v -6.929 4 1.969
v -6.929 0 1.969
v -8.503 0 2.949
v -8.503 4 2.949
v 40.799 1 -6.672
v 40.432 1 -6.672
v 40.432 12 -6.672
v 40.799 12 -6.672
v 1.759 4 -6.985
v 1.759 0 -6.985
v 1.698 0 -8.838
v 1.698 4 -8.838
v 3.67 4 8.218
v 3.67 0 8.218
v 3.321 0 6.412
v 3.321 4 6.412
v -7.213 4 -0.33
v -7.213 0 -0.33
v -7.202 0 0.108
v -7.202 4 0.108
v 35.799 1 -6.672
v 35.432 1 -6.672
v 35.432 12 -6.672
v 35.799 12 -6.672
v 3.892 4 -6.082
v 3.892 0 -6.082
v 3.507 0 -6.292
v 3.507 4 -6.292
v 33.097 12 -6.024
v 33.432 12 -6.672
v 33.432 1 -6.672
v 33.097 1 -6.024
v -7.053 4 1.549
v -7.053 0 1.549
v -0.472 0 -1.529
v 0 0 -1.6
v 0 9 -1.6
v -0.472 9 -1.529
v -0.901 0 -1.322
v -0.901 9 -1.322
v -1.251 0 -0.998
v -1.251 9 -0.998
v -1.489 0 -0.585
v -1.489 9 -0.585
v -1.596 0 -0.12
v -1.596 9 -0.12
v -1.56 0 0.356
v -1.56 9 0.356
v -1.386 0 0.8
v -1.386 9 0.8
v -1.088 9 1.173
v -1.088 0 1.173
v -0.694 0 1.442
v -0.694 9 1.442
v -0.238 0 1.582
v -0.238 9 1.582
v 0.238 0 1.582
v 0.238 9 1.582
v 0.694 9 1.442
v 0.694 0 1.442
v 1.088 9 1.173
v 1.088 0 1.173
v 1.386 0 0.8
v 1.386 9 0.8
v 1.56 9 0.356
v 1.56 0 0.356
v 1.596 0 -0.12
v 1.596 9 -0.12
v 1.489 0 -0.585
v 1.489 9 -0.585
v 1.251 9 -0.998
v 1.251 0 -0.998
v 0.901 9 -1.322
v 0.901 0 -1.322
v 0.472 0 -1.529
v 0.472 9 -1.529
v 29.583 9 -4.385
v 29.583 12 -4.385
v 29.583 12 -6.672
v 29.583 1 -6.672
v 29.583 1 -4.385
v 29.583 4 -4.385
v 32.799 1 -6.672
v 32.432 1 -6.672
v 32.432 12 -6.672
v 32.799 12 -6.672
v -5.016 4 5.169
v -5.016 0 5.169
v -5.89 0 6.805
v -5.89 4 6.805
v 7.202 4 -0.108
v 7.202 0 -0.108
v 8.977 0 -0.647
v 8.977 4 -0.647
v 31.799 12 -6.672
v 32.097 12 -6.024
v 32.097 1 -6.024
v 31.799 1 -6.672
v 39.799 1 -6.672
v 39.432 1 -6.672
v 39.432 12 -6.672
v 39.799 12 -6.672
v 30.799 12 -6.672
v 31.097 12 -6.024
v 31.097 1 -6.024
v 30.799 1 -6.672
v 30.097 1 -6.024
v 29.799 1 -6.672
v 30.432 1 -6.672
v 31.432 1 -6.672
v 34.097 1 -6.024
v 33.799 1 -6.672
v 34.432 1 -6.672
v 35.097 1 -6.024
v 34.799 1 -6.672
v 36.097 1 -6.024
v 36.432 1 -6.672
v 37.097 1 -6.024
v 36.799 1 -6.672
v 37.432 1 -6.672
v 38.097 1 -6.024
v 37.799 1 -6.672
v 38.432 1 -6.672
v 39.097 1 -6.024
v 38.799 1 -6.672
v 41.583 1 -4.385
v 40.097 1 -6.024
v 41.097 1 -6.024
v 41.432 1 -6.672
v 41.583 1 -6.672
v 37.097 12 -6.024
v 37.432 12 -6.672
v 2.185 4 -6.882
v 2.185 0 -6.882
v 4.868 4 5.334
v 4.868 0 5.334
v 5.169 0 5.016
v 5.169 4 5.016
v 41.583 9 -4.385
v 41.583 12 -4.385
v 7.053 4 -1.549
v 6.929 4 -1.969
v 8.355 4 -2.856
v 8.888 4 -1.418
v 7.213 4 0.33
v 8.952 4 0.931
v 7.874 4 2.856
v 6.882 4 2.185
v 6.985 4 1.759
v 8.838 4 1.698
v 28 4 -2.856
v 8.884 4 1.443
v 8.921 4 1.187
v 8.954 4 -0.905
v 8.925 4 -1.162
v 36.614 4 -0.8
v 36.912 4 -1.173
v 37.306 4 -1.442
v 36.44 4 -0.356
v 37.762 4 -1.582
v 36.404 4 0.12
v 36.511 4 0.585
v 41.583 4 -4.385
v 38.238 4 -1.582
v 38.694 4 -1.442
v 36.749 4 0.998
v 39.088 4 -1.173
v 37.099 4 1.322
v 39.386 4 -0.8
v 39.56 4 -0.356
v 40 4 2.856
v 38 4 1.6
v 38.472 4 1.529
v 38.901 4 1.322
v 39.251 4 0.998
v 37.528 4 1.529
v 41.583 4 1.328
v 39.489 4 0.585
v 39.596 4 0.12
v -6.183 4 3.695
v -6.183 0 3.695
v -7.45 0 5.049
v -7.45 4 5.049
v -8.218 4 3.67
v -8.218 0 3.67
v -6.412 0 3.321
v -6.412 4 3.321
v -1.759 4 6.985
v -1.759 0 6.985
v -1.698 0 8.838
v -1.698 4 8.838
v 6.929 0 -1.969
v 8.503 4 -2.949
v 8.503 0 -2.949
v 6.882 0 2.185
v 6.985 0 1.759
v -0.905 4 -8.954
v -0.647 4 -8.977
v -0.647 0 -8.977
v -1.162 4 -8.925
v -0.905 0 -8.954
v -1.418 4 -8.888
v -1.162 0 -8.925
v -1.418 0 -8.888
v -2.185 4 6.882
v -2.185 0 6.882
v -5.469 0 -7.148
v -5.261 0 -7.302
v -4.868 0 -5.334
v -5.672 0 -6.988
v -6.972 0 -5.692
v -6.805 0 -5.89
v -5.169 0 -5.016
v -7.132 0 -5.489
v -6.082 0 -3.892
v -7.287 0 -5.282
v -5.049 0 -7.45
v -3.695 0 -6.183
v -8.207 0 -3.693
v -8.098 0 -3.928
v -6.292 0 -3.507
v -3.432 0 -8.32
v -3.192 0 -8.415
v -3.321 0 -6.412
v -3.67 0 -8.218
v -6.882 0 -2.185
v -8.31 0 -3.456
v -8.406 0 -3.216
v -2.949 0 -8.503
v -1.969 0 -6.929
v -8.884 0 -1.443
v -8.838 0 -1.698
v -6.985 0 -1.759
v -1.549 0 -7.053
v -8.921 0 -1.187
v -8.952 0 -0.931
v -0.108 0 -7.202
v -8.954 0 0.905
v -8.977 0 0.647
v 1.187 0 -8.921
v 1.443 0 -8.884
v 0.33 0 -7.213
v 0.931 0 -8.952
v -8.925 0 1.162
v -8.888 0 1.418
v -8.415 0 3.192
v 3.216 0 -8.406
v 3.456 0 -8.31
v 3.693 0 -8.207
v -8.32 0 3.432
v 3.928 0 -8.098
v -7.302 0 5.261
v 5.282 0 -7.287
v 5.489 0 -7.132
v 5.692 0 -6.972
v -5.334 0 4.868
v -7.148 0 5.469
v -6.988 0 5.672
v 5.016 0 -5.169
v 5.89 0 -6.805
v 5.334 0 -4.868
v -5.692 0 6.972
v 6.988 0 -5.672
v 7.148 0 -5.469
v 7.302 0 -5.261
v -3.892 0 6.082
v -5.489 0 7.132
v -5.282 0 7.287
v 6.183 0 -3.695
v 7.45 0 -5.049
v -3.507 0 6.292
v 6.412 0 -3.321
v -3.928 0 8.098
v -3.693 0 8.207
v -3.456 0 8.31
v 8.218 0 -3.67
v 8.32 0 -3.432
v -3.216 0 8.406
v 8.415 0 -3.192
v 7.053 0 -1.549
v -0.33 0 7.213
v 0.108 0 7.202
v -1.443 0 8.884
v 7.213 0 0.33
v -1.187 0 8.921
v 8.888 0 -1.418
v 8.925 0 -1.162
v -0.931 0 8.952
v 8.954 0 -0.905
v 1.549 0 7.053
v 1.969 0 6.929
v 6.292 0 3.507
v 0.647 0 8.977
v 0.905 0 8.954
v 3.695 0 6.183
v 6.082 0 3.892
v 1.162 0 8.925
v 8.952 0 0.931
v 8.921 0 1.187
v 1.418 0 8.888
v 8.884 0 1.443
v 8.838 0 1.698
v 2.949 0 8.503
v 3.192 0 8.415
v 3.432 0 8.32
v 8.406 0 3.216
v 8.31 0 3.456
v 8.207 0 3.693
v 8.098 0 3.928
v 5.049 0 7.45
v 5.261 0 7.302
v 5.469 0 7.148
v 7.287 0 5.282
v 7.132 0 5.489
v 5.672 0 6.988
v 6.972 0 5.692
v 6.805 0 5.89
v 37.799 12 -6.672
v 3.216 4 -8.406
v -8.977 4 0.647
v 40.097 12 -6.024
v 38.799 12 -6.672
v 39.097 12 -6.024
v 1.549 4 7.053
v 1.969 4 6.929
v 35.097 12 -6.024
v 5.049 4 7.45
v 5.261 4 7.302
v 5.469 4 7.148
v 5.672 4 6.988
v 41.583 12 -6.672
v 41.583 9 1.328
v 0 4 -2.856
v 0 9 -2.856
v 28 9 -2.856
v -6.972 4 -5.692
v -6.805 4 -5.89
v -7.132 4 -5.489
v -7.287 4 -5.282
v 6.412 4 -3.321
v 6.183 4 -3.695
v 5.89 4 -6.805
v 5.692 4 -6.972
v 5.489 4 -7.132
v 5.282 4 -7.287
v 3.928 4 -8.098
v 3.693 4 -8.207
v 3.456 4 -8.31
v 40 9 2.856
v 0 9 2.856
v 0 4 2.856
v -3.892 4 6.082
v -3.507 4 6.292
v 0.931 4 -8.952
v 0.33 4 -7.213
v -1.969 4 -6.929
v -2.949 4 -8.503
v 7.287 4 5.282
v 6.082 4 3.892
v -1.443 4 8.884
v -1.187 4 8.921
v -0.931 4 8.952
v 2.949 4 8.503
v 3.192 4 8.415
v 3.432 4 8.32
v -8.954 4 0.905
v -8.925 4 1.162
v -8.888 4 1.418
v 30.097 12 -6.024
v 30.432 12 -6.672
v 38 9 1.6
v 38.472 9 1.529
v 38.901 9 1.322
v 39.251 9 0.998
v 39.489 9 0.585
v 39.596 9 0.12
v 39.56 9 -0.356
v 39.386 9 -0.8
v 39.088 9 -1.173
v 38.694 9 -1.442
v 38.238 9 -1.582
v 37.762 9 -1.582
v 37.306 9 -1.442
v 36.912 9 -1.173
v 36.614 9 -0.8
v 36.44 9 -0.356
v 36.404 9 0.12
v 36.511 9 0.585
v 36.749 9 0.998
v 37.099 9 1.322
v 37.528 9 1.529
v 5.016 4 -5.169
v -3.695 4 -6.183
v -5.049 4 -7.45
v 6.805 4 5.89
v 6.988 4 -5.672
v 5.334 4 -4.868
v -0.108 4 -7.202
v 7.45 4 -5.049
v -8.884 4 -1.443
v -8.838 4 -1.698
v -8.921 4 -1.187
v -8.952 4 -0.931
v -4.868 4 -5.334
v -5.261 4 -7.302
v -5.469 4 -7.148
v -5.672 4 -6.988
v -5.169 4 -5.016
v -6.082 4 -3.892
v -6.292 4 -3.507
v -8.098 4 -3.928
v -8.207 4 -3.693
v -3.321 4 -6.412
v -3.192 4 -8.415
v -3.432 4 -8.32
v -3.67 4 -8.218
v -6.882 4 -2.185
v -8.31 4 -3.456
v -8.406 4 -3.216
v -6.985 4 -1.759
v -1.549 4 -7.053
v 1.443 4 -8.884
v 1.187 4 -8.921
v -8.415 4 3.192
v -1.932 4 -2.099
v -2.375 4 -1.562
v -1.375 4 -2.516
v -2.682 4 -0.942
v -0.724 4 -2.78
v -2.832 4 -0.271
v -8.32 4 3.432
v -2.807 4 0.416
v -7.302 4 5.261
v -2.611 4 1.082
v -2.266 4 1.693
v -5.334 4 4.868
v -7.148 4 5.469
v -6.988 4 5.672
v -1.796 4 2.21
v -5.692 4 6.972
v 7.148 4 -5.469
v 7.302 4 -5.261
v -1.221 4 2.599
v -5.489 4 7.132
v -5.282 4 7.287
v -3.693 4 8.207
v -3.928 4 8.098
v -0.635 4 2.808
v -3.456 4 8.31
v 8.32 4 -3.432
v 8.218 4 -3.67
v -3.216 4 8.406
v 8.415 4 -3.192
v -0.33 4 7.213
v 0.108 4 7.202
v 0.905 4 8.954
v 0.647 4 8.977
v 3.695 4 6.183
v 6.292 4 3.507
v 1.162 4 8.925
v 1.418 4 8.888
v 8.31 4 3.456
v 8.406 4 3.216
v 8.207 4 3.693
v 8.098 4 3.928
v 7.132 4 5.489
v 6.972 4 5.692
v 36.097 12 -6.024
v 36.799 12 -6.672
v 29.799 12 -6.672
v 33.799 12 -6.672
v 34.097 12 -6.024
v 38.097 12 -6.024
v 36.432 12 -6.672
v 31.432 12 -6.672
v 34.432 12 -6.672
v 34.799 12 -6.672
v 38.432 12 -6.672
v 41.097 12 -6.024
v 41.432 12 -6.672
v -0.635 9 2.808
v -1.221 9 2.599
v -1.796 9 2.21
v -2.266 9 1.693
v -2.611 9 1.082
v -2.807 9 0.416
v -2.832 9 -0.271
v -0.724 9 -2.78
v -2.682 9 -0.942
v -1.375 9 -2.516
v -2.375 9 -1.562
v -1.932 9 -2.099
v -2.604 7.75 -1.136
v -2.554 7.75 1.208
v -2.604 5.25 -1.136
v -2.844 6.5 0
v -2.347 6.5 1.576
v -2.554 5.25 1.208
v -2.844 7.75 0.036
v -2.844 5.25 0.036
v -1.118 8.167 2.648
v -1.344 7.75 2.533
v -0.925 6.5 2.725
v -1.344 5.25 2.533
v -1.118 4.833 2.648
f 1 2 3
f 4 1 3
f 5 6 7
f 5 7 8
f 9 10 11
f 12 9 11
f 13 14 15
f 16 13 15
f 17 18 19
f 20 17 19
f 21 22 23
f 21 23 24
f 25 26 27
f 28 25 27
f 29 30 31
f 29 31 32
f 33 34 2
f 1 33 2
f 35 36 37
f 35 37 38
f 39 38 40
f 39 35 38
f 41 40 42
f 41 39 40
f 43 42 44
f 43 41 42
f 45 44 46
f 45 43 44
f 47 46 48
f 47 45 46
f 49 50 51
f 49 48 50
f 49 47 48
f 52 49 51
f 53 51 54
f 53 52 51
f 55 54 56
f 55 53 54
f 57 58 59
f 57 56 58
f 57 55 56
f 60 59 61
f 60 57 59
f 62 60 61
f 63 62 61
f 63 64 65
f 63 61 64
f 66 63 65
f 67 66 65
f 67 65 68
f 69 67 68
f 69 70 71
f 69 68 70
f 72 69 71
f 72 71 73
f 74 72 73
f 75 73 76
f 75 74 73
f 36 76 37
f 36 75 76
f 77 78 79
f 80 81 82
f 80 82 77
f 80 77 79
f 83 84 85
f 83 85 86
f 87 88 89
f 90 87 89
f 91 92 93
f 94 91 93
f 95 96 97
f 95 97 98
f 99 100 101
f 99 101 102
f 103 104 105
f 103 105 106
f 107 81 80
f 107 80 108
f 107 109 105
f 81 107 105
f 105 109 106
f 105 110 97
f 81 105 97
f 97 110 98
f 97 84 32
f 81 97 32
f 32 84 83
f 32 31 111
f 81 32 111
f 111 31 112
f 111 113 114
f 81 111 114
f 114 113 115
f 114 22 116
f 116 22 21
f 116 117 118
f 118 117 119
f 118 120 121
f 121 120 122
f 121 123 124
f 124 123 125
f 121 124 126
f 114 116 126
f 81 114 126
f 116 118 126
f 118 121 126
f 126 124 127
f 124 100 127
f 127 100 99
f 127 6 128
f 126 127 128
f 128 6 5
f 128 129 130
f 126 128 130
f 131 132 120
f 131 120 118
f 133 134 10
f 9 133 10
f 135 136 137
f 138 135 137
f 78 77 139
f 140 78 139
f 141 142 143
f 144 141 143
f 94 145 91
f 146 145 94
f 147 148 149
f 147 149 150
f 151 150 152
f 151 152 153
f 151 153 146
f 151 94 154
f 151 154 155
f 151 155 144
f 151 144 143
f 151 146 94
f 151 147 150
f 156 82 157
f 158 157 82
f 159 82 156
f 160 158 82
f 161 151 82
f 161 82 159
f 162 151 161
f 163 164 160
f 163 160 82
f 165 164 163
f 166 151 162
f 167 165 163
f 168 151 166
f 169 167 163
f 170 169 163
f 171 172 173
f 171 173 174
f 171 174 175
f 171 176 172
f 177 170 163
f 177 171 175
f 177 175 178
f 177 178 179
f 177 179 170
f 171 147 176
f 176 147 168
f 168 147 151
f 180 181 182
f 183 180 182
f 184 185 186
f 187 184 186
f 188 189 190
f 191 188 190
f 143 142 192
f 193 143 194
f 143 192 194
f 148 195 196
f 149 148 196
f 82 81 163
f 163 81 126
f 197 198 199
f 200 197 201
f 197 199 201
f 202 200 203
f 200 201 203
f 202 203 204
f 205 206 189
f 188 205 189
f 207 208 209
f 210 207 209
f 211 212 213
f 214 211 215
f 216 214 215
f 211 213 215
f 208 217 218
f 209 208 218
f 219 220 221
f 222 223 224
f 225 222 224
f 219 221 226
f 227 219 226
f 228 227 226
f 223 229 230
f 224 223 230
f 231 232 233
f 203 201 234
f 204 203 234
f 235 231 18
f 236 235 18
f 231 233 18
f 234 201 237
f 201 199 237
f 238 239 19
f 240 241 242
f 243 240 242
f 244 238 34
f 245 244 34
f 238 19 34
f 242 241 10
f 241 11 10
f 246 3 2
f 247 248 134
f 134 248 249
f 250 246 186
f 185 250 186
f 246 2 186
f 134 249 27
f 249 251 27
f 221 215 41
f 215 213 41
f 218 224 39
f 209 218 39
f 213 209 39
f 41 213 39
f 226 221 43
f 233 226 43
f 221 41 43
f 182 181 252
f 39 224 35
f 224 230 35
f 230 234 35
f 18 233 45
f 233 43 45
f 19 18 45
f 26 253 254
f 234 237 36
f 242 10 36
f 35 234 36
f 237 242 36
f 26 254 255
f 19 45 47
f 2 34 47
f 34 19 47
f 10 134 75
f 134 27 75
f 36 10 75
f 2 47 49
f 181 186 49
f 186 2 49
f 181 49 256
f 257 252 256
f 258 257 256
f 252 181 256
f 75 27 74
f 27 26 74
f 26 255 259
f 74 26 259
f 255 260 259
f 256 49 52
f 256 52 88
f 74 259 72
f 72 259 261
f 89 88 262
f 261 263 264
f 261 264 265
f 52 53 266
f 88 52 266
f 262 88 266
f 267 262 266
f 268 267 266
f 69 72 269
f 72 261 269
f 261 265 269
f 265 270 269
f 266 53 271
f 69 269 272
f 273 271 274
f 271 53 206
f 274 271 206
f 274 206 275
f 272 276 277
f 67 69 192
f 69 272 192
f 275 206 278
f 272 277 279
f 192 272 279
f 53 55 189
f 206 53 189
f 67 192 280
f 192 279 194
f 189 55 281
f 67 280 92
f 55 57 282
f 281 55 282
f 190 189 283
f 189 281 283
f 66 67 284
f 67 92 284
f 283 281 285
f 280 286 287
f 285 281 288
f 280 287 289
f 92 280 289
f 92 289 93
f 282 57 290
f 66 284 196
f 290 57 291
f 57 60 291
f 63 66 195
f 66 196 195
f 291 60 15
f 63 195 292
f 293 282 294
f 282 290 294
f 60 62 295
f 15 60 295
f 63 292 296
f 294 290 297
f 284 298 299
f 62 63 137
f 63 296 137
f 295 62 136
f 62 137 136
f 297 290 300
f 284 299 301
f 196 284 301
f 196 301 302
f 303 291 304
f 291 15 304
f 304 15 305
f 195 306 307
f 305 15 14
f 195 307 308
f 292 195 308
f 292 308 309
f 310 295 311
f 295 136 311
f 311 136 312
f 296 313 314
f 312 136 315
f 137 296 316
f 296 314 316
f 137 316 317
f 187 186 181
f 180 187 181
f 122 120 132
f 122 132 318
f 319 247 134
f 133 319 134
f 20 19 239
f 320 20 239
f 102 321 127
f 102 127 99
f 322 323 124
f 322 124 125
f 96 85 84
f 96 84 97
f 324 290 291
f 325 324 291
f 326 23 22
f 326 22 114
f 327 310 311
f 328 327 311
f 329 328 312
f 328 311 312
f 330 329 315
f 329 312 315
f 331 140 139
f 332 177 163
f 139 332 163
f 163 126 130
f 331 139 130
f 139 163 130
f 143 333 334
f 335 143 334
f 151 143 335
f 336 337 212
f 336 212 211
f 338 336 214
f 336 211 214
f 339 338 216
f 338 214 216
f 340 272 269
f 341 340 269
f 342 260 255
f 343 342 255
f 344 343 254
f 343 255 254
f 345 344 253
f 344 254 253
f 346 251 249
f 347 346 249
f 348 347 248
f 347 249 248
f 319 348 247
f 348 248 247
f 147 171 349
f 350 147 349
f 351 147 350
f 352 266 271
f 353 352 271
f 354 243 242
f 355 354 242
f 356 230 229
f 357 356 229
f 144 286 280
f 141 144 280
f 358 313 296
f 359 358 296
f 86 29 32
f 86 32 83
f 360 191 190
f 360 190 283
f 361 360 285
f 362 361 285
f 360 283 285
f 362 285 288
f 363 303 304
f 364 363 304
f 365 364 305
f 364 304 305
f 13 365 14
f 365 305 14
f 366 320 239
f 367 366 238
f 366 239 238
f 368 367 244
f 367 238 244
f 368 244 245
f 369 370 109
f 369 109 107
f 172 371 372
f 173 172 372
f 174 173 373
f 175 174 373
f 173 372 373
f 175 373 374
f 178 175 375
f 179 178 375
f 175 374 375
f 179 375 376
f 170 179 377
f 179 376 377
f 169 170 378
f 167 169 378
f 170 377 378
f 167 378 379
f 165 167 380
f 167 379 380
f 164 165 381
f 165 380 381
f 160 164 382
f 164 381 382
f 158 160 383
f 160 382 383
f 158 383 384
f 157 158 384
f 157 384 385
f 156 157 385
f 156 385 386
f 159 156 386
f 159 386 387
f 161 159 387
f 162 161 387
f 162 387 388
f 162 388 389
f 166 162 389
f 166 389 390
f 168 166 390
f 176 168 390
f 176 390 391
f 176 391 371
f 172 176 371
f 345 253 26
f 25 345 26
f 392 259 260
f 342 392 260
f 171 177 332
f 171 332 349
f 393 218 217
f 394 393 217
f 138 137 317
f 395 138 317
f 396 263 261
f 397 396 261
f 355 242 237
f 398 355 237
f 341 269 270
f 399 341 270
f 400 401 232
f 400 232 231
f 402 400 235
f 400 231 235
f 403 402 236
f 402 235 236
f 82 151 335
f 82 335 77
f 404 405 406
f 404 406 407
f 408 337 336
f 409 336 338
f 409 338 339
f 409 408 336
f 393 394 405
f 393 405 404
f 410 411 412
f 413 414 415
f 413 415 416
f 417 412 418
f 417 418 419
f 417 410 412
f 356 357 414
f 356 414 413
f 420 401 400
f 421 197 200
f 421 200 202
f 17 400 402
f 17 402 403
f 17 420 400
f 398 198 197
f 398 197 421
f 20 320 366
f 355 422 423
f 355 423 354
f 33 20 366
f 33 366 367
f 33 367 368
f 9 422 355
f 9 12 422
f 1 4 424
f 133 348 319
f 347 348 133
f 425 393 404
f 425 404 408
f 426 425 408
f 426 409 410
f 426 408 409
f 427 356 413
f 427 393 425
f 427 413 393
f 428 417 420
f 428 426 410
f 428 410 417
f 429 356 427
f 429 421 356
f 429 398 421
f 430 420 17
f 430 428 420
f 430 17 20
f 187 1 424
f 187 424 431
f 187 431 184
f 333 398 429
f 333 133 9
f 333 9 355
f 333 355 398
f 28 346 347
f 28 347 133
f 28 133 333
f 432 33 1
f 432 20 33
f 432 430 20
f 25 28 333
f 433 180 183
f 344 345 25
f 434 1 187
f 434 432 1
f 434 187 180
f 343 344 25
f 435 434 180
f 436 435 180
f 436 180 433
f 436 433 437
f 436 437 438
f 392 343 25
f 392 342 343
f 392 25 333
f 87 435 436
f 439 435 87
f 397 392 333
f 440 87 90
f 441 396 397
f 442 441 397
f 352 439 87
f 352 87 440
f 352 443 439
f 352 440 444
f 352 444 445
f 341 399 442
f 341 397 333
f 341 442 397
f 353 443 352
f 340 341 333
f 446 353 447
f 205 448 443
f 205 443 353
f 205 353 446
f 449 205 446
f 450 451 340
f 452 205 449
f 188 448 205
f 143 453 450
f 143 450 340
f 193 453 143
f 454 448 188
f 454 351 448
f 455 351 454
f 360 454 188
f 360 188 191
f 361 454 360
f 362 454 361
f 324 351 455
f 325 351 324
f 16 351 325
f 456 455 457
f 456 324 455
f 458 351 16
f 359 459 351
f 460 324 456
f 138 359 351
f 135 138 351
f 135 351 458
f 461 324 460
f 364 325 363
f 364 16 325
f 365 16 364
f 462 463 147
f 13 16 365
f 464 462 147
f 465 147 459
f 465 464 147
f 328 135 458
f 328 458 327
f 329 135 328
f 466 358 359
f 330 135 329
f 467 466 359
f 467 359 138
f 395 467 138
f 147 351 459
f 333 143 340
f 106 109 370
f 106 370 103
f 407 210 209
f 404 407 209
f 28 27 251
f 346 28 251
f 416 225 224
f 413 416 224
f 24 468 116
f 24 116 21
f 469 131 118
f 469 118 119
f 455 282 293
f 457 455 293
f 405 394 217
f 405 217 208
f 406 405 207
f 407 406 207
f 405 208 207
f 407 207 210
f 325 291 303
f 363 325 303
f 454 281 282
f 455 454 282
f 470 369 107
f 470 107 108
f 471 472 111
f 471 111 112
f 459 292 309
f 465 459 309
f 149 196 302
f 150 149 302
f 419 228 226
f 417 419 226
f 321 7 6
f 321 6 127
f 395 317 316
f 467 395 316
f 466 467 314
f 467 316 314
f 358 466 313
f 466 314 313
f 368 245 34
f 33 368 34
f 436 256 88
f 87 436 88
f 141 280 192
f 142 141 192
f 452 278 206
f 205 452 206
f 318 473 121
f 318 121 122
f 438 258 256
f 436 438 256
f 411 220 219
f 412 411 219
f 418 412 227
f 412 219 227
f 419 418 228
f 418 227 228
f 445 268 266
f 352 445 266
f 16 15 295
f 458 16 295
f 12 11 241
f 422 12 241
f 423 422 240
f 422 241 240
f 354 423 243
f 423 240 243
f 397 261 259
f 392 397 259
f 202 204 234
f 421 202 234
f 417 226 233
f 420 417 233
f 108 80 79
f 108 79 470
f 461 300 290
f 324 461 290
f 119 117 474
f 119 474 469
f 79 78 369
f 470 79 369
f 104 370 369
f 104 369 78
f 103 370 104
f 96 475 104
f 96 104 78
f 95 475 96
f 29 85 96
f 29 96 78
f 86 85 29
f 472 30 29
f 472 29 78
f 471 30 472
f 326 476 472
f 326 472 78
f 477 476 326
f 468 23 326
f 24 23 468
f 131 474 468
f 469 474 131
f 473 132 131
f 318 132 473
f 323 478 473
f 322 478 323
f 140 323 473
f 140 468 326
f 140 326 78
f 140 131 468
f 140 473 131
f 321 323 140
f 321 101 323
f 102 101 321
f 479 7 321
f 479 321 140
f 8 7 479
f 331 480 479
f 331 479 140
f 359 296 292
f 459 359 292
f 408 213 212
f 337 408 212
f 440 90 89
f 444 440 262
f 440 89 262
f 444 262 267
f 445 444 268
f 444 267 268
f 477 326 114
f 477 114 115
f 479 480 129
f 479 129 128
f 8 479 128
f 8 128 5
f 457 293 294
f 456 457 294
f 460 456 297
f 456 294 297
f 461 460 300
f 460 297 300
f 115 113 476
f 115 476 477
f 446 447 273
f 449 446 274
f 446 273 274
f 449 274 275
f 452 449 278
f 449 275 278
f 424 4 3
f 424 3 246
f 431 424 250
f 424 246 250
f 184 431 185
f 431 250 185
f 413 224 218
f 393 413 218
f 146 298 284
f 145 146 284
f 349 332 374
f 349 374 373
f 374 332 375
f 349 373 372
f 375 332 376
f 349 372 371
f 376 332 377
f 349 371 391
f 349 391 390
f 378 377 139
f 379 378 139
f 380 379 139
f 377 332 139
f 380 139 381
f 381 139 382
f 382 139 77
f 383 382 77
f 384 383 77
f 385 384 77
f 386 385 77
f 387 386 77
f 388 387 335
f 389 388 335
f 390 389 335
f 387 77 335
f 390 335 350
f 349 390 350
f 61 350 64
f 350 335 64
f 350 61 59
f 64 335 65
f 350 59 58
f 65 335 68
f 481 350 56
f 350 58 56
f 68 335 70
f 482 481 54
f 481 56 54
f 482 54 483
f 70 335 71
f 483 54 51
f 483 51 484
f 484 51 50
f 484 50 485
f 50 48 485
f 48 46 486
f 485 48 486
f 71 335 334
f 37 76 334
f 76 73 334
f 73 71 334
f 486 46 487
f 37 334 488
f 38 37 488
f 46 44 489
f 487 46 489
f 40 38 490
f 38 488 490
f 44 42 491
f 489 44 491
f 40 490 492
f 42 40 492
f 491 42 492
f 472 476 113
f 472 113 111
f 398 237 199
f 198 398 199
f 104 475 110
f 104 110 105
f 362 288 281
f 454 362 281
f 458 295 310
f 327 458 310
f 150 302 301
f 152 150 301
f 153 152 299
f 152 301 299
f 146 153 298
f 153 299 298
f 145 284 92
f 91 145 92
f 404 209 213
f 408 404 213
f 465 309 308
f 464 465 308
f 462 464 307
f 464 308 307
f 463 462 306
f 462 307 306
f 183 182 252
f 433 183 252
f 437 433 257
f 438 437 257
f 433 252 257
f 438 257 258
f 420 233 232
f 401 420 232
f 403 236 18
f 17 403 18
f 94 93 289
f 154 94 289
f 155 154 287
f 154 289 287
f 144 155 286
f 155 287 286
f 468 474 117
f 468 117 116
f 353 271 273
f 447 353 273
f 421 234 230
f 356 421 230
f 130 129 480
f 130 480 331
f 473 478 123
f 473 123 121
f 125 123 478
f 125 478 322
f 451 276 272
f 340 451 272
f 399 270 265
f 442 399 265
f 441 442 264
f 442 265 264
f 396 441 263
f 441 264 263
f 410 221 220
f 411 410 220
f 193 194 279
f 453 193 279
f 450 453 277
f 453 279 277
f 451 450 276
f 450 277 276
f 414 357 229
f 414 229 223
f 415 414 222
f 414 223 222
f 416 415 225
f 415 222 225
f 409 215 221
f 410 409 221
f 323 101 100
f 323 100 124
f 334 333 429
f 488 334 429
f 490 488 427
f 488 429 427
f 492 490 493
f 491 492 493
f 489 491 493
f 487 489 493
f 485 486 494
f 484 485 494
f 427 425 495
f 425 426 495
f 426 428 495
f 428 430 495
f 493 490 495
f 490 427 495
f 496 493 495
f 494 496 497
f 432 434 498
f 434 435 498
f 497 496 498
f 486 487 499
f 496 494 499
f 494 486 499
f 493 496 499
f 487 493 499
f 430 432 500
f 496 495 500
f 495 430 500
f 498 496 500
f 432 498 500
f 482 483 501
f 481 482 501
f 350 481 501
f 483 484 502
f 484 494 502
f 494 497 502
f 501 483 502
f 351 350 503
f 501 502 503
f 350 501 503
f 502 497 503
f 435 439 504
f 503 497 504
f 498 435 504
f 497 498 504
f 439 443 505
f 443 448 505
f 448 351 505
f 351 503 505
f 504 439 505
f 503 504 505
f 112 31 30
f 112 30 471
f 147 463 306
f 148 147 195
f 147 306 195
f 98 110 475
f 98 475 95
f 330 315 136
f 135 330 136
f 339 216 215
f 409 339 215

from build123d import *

# Parameters (mm, degrees)
ESQUISSE1_R                  = 9
BOSS_EXTRU_1_DEPTH           = 4
BOSS_EXTRU_2_DEPTH           = 5
ENL_V_MAT_EXTRU_1_DEPTH      = 10
ENL_V_MAT_EXTRU_1_DEPTH_BACK = 12
ESQUISSE3_R                  = 1.6
ENL_V_MAT_EXTRU_2_DEPTH      = 4
BOSS_EXTRU_3_DEPTH           = 3
BOSS_EXTRU_3_DEPTH_BACK      = 8
ESQUISSE5_W                  = 12
ESQUISSE5_H                  = 2.28739505
ENL_V_MAT_EXTRU_3_DEPTH      = 11
ESQUISSE7_R                  = 1.6
ENL_V_MAT_EXTRU_4_DEPTH      = 11


with BuildPart() as part:
    # Esquisse1 → Boss.-Extru.1 (new body)
    with BuildSketch(Plane(origin=(0, 0, 0), x_dir=(1, 0, 0), z_dir=(0, 1, 0))):
        with Locations(Location((0, 0, 0), (0, 0, 270))):
            Circle(ESQUISSE1_R)
    extrude(amount=BOSS_EXTRU_1_DEPTH)

    # Esquisse2 → Boss.-Extru.2 (add)
    with BuildSketch(Plane(origin=(0, 4, 0), x_dir=(1, 0, 0), z_dir=(0, 1, 0))):
        with BuildLine():
            Line((0, 2.856302475), (28, 2.856302475))
            Line((28, 2.856302475), (29.582547561, 4.38455089))
            Line((29.582547561, 4.38455089), (29.582547561, 6.67194594))
            Line((29.582547561, 6.67194594), (41.582547561, 6.67194594))
            Line((41.582547561, 6.67194594), (41.582547561, -1.32805406))
            Line((41.582547561, -1.32805406), (40, -2.856302475))
            Line((40, -2.856302475), (28, -2.856302475))
            Line((28, -2.856302475), (0, -2.856302475))
            add(Edge.make_bspline(
                [(0, 2.856302475), (-1.606608321, 2.917963895), (-4.109305793, 0.012086108), (-1.551274166, -2.952682253), (0, -2.856302475)],
                knots=[0, 0, 0, 0, 0.499550893, 1, 1, 1, 1], degree=3))
        make_face()
    extrude(amount=BOSS_EXTRU_2_DEPTH)

    # Esquisse3 → Enlèv. mat.-Extru.1 (cut, two sides: drawn at the far end of the back side and taken through both)
    with BuildSketch(Plane(origin=(0, 9, 0), x_dir=(1, 0, 0), z_dir=(0, 1, 0)).offset(-ENL_V_MAT_EXTRU_1_DEPTH_BACK)):
        with Locations(Location((0, 0, 0), (0, 0, 90))):
            Circle(ESQUISSE3_R)
    extrude(amount=ENL_V_MAT_EXTRU_1_DEPTH + ENL_V_MAT_EXTRU_1_DEPTH_BACK, mode=Mode.SUBTRACT)

    # Esquisse4 → Enlèv. mat.-Extru.2 (cut)
    with BuildSketch(Plane.XZ):
        Polygon((-1.417985005, -8.887593517), (-1.548540755, -7.052961635), (-1.968711567, -6.928820259), (-2.948701489, -8.503244059), (-2.361037532, -9.099305947), align=None)
        Polygon((-3.669946805, -8.217754587), (-3.321216304, -6.411845955), (-3.69493999, -6.183186386), (-5.04902843, -7.45032294), (-4.635660805, -8.178173136), align=None)
        Polygon((-5.671807795, -6.987889262), (-4.86755645, -5.33377357), (-5.169364359, -5.016178579), (-6.805272427, -5.889674625), (-6.594371455, -6.699711341), align=None)
        Polygon((-7.287144457, -5.281810832), (-6.082180668, -3.892213331), (-6.291505089, -3.507326492), (-8.097748355, -3.927654717), (-8.103686589, -4.76467529), align=None)
        Polygon((-8.405874267, -3.215785722), (-6.882314325, -2.185405185), (-6.984890145, -1.7594559), (-8.838376114, -1.697971632), (-9.060748873, -2.504934491), align=None)
        Polygon((-8.951757637, -0.93061013), (-7.213429634, -0.329665287), (-7.202266481, 0.108318704), (-8.976683148, 0.647425415), (-9.400336095, -0.074486547), align=None)
        Polygon((-8.887593517, 1.417985005), (-7.052961635, 1.548540755), (-6.928820259, 1.968711567), (-8.503244059, 2.948701489), (-9.099305947, 2.361037532), align=None)
        Polygon((-8.217754587, 3.669946805), (-6.411845955, 3.321216304), (-6.183186386, 3.69493999), (-7.45032294, 5.04902843), (-8.178173136, 4.635660805), align=None)
        Polygon((-6.987889262, 5.671807795), (-5.33377357, 4.86755645), (-5.016178579, 5.169364359), (-5.889674625, 6.805272427), (-6.699711341, 6.594371455), align=None)
        Polygon((-5.281810832, 7.287144457), (-3.892213331, 6.082180668), (-3.507326492, 6.291505089), (-3.927654717, 8.097748355), (-4.76467529, 8.103686589), align=None)
        Polygon((-3.215785722, 8.405874267), (-2.185405185, 6.882314325), (-1.7594559, 6.984890145), (-1.697971632, 8.838376114), (-2.504934491, 9.060748873), align=None)
        Polygon((-0.93061013, 8.951757637), (-0.329665287, 7.213429634), (0.108318704, 7.202266481), (0.647425415, 8.976683148), (-0.074486547, 9.400336095), align=None)
        Polygon((1.417985005, 8.887593517), (1.548540755, 7.052961635), (1.968711567, 6.928820259), (2.948701489, 8.503244059), (2.361037532, 9.099305947), align=None)
        Polygon((3.669946805, 8.217754587), (3.321216304, 6.411845955), (3.69493999, 6.183186386), (5.04902843, 7.45032294), (4.635660805, 8.178173136), align=None)
        Polygon((5.671807795, 6.987889262), (4.86755645, 5.33377357), (5.169364359, 5.016178579), (6.805272427, 5.889674625), (6.594371455, 6.699711341), align=None)
        Polygon((7.287144457, 5.281810832), (6.082180668, 3.892213331), (6.291505089, 3.507326492), (8.097748355, 3.927654717), (8.103686589, 4.76467529), align=None)
        Polygon((8.405874267, 3.215785722), (6.882314325, 2.185405185), (6.984890145, 1.7594559), (8.838376114, 1.697971632), (9.060748873, 2.504934491), align=None)
        Polygon((8.951757637, 0.93061013), (7.213429634, 0.329665287), (7.202266481, -0.108318704), (8.976683148, -0.647425415), (9.400336095, 0.074486547), align=None)
        Polygon((8.887593517, -1.417985005), (7.052961635, -1.548540755), (6.928820259, -1.968711567), (8.503244059, -2.948701489), (9.099305947, -2.361037532), align=None)
        Polygon((8.217754587, -3.669946805), (6.411845955, -3.321216304), (6.183186386, -3.69493999), (7.45032294, -5.04902843), (8.178173136, -4.635660805), align=None)
        Polygon((6.987889262, -5.671807795), (5.33377357, -4.86755645), (5.016178579, -5.169364359), (5.889674625, -6.805272427), (6.699711341, -6.594371455), align=None)
        Polygon((5.281810832, -7.287144457), (3.892213331, -6.082180668), (3.507326492, -6.291505089), (3.927654717, -8.097748355), (4.76467529, -8.103686589), align=None)
        Polygon((3.215785722, -8.405874267), (2.185405185, -6.882314325), (1.7594559, -6.984890145), (1.697971632, -8.838376114), (2.504934491, -9.060748873), align=None)
        Polygon((0.93061013, -8.951757637), (0.329665287, -7.213429634), (-0.108318704, -7.202266481), (-0.647425415, -8.976683148), (0.074486547, -9.400336095), align=None)
    extrude(amount=-ENL_V_MAT_EXTRU_2_DEPTH, mode=Mode.SUBTRACT)

    # Esquisse5 → Boss.-Extru.3 (add, two sides: drawn at the far end of the back side and taken through both)
    with BuildSketch(Plane(origin=(0, 9, 0), x_dir=(1, 0, 0), z_dir=(0, 1, 0)).offset(-BOSS_EXTRU_3_DEPTH_BACK)):
        with Locations((35.582547561, 5.528248415)):
            Rectangle(ESQUISSE5_W, ESQUISSE5_H)
    extrude(amount=BOSS_EXTRU_3_DEPTH + BOSS_EXTRU_3_DEPTH_BACK)

    # Esquisse6 → Enlèv. mat.-Extru.3 (cut)
    with BuildSketch(Plane(origin=(0, 12, 0), x_dir=(1, 0, 0), z_dir=(0, 1, 0))):
        Polygon((41.432080312, 6.67194594), (41.097414224, 6.023830859), (40.799482778, 6.67194594), (41.122702548, 7.12855331), align=None)
        Polygon((40.432080312, 6.67194594), (40.097414224, 6.023830859), (39.799482778, 6.67194594), (40.122702548, 7.12855331), align=None)
        Polygon((39.432080312, 6.67194594), (39.097414224, 6.023830859), (38.799482778, 6.67194594), (39.097414224, 7.165876079), align=None)
        Polygon((38.432080312, 6.67194594), (38.097414224, 6.023830859), (37.799482778, 6.67194594), (38.205026004, 7.165876079), align=None)
        Polygon((37.432080312, 6.67194594), (37.097414224, 6.023830859), (36.799482778, 6.67194594), (37.097414224, 7.165876079), align=None)
        Polygon((36.432080312, 6.67194594), (36.097414224, 6.023830859), (35.799482778, 6.67194594), (36.097414224, 7.165876079), align=None)
        Polygon((35.432080312, 6.67194594), (35.097414224, 6.023830859), (34.799482778, 6.67194594), (35.097414224, 7.165876079), align=None)
        Polygon((34.432080312, 6.67194594), (34.097414224, 6.023830859), (33.799482778, 6.67194594), (34.205026004, 7.165876079), align=None)
        Polygon((33.432080312, 6.67194594), (33.097414224, 6.023830859), (32.799482778, 6.67194594), (33.205026004, 7.165876079), align=None)
        Polygon((32.432080312, 6.67194594), (32.097414224, 6.023830859), (31.799482778, 6.67194594), (32.209344848, 7.15648094), align=None)
        Polygon((31.432080312, 6.67194594), (31.097414224, 6.023830859), (30.799482778, 6.67194594), (31.097414224, 6.955035779), align=None)
        Polygon((30.432080312, 6.67194594), (30.097414224, 6.023830859), (29.799482778, 6.67194594), (30.166939204, 7.248729466), align=None)
    extrude(amount=-ENL_V_MAT_EXTRU_3_DEPTH, mode=Mode.SUBTRACT)

    # Esquisse7 → Enlèv. mat.-Extru.4 (cut)
    with BuildSketch(Plane(origin=(0, 9, 0), x_dir=(1, 0, 0), z_dir=(0, 1, 0))):
        with Locations(Location((38, 0, 0), (0, 0, 270))):
            Circle(ESQUISSE7_R)
    extrude(amount=-ENL_V_MAT_EXTRU_4_DEPTH, mode=Mode.SUBTRACT)


solid = part.part
